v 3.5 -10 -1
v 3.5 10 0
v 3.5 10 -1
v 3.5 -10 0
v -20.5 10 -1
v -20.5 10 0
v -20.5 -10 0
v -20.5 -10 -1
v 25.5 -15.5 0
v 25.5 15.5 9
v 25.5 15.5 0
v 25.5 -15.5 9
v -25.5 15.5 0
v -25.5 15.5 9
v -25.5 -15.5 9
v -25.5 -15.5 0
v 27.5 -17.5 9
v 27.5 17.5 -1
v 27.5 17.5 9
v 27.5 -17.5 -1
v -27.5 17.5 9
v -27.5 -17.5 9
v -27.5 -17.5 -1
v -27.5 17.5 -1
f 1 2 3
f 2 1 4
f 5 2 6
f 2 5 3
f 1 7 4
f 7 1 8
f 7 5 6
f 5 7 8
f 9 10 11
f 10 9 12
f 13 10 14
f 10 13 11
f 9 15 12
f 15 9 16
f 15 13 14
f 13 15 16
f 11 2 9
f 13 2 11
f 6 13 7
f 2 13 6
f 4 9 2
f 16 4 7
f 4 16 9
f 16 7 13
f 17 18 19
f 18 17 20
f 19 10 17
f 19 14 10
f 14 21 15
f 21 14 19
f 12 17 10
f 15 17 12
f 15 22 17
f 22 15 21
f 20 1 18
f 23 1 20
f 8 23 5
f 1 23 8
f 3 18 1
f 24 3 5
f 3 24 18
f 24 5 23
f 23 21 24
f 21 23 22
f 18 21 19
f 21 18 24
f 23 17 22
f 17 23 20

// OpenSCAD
// file: ../Lib/o-ring.scad
module o_ring(id=20,girth=2.5){
    rotate_extrude(angle=360)translate([(id+girth)/2,0])circle(d=girth);
    //cylinder(d=id,h=0.1, center=true);    
}

o_ring(id=40, girth=5);
// file: ../Lib/fillet_cylinder.scad
module filleted_cylinder(
    cylinder_height=2,
    cylinder_radius=1,
    fillet_radius_bottom=1,
    fillet_radius_top=0,
    nfaces=50
) {
    /* created by Kevin Lam on Dec 3, 2016 */
    union() {      
        cylinder(cylinder_height, r=cylinder_radius, $fn=nfaces, false);
        
        if (fillet_radius_bottom > 0) {
            difference() {
                cylinder(fillet_radius_bottom, r=cylinder_radius+fillet_radius_bottom, $fn=nfaces, false);
                translate([0, 0, fillet_radius_bottom])
                rotate_extrude($fn=nfaces)
                translate([cylinder_radius+fillet_radius_bottom, 0, 0])
                circle(fillet_radius_bottom, $fn=nfaces);
            }
        }
        
        if (fillet_radius_top>0) {
            difference() {
                translate([0,0,cylinder_height-fillet_radius_top])
                cylinder(fillet_radius_top, r=cylinder_radius+fillet_radius_top, $fn=nfaces, false);
                
                translate([0, 0, cylinder_height-fillet_radius_top])
                rotate_extrude($fn=nfaces)
                translate([cylinder_radius+fillet_radius_top, 0, 0])
                circle(fillet_radius_top, $fn=nfaces);
            }
        }
    }
}
// file: ../Lib/prism.scad
   module prism(l, w, h){
   polyhedron(
           points=[[0,0,0], [l,0,0], [l,w,0], [0,w,0], [0,w,h], [l,w,h]],
           faces=[[0,1,2,3],[5,4,3,2],[0,4,5,1],[0,3,4],[5,2,1]]
           );

   }
   
// file: ../Lib/corner_radiuser.scad
module cornerRadiuser(radius=6){
    difference(){
        translate([radius/2,radius/2,0])
        cube([radius,radius,radius*2], center=true);
        cylinder(h=(radius*2)+2,r=radius, center=true);
    }
}
// file: ../Lib/steppers.scad
/**
 * Implementation of a model of a 28BYJ-48 type cheapo stepper motor
 */
use <mirrorcopy.scad>;
module stepper28BYJ48(){
    color("light grey"){
        translate([0,-8,0]){
            // Motor body
            translate([0,0,(19/2)*-1]){
                cylinder(d=28,h=19, center=true);
            }

            // Motor snooter
            translate([0,8,0]){
                translate([0,0,(1.5/2)])cylinder(d=9,h=1.5, center=true);
                difference(){
                    translate([0,0,(5/2)+2])cylinder(d=5,h=6, center=true);
                    mirrorCopy([0,1,0]){
                        translate([0,4,(5/2)+2.1])cube([5,5,6.2], center=true);
                    }
                }
            }
            
            // cable gland
            translate([0,(17/2)*-1,(19/2)*-1]){
                cube([14.8,17,19], center=true);
            }
            
            // Attachment crossbar
            difference(){
                hull(){
                    mirrorCopy([1,-0,0]){
                        translate([(35/2),0,(1/2)*-1]){
                            cylinder(h=1,d=7, center=true);
                        }
                    }
                }
                mirrorCopy([1,-0,0]){
                    translate([(35/2),0,(1/2)*-1]){
                        cylinder(h=1+0.01,d=4.2, center=true);
                    }
                }
            }
        }
    }
}


module stepper28BYJ48_cutouts(){
    color("orange"){
        translate([0,-8,0]){
            mirrorCopy([1,-0,0]){
                translate([(35/2),0,(1/2)*-1]){
                    cylinder(h=1+0.01,d=4.2, center=true);
                }
            }
        }
    }
}

module nemaCutout(shaftClearance, shaftGirth, shaftLength, frameSize, holeSpacing,holeDiameter=3,       nemaSlotSlackMM=0, shaft=false){
    translate([0,0,frameSize/-2]){
        hull(){
            mirrorCopy([0,1,0]){
                translate([0,nemaSlotSlackMM/2]){
                    cube([frameSize*1.01,frameSize*1.01,frameSize], center=true);
                }
            }
        }
    }
    if(!shaft){
        translate([0,0,10/2]){
            mirrorCopy([1,0,0]){
                mirrorCopy([0,1,0]){
                    translate([holeSpacing/2,holeSpacing/2,0]){
                        hull(){
                            mirrorCopy([0,1,0]){
                                translate([0,nemaSlotSlackMM/2,0]){
                                    cylinder(d=holeDiameter*1.1,h=30,center=true);
                                }
                            }
                        }
                    }
                }
            }
        }
    }
    
    if(!shaft){
        translate([0,0,-0.5]){
            cylinder(d=shaftClearance*1.03,h=shaftLength+1);
        }
    }else{
        difference(){
            cylinder(d=shaftGirth*1.03,h=shaftLength*2, $fn=360);
            translate([frameSize/-2,(shaftGirth/2)-(shaftGirth)*0.15,shaftLength*0.3+0.01]){
                cube([frameSize,frameSize/2,shaftLength*0.70]);
                translate([0,0,shaftLength*0.70-1])cube([frameSize,frameSize/2,shaftLength+1]);
            }
        }
    }
}

module nema14_cutout(){
    nemaCutout(22,5,24,35,26,3,2, shaft);
}

module nema17_cutout(shaft=false){
    
    nemaCutout(22,5,24,42.3,31,3,2, shaft);
}

nema17_cutout(true);
// file: ../Lib/metric_bolts.scad
capSizeMSizeMultiplier = 1.66*1.01;
printingKerfMM = 0.6;
circleFacets = 60;
boltColour = "LightSkyBlue";
boltClearanceColour = "LightSteelBlue";
boltClearanceTransparency = 0.3;

module metricBoltHex(mSize, structural=false, recessNut=0, chamfer=false){
    // Hex diameter = mSize * 1.8, (or 2.0 if structural
    // We add 1% to make the hex slip in better
    hexDiameter = (mSize * (structural?2.0:1.8) * 1.01) + printingKerfMM;

    color(boltColour)
    translate([0,0,(mSize*0.7)/2])
    cylinder(d=hexDiameter,h=mSize * 0.7, $fn=6, center=true);
    
    if(recessNut > 0){
        color(boltClearanceColour, boltClearanceTransparency)
        translate([0,0,(recessNut/2)*-1+0.1])
        cylinder(d=hexDiameter,h=recessNut+0.1, $fn=6, center=true);
    }
    if(chamfer){
        chamferHeight = mSize*1.5*0.595;
        color(boltClearanceColour, boltClearanceTransparency)
        translate([0,0,(mSize * 0.7)+(chamferHeight/2)])
        cylinder(d1=hexDiameter,d2=0,h=chamferHeight, center=true, $fn=6);
    }
}

module metricSocketCap(mSize, length, structural=false,recessCap=0, chamfer=false, overrideCapSize=0){
    //cap size = M number * 1.5.
    // We add 1% to make the cap head spin nicely in the hole.
    capSize = overrideCapSize > 0 ? overrideCapSize : (mSize * capSizeMSizeMultiplier) + printingKerfMM;
    
    color(boltColour)
        translate([0,0,(length + ((mSize*1.25)/2))])
            cylinder(d=capSize,h=mSize*1.25, center=true, $fn=circleFacets);
    //echo (str("cap size is ", capSize));
    if(recessCap > 0){
        color(boltClearanceColour, boltClearanceTransparency)
        translate([0,0,(length + ((recessCap/2)+(mSize*1.25)))])
        cylinder(d=capSize,h=recessCap, center=true, $fn=circleFacets);
    }
    if(chamfer){
        color(boltClearanceColour, boltClearanceTransparency)
        translate([0,0,(length-((mSize*1.5*0.595)/2))])
        cylinder(d2=capSize,d1=0,h=mSize*1.5*0.595, center=true, $fn=circleFacets);
    }
}

module metricShaft(mSize, length, structural=false){
    color(boltColour)
        translate([0,0,(length/2)])
            cylinder(d=mSize+printingKerfMM, h=length+0.01, center=true, $fn=circleFacets);
}

module metricSocketScrew(mSize, length, structural=false, recessCap=0, chamfer=false, overrideCapSize=0){
    metricSocketCap(mSize, length, structural=structural, recessCap=recessCap, chamfer=chamfer, overrideCapSize=overrideCapSize);
    metricShaft(mSize, length, structural=structural);
}

module metricCapheadAndBolt(mSize, length=40, structural=false, recessCap=0, recessNut=0, chamfer=false, overrideCapSize=0){
    capSize = overrideCapSize > 0 ? overrideCapSize : (mSize * capSizeMSizeMultiplier) + printingKerfMM;

    /*echo (str("Creating a M",mSize, " size, ", length, "mm long bolt with a ", capSize, "mm wide caphead and bolt ", chamfer?"with":"without", " chamfering."));
    if(recessCap){
        echo (str("It has a ", recessCap, "mm recessed cap"));
    }
    if(recessNut){
        echo (str("It has a ", recessCap, "mm recessed nut"));
    }/**/
    translate([0,0,((length/2)+((mSize*1.25)/2))*-1])
    union(){
        translate([0, 0, 0])
        metricSocketScrew(mSize, length, structural=structural, recessCap=recessCap, chamfer=chamfer, overrideCapSize=overrideCapSize);
        metricBoltHex(mSize,structural, recessNut=recessNut, chamfer=chamfer);
    }
}

/**/
translate([0,10,0])
metricCapheadAndBolt(6, 40);

translate([20,10,0])
metricCapheadAndBolt(6, 40, recessNut=1, recessCap=1, chamfer=true);
/**/
/*
translate([0,10,0])
metricCapheadAndBolt(6, 20, recessNut=10, recessCap=10);
/*
translate([0,20,0])
metricCapheadAndBolt(6, 20, chamfer=true);

translate([20,0,0])
metricCapheadAndBolt(10, 40);

translate([20,20,0])
metricCapheadAndBolt(10, 40, recessNut=10, recessCap=10);

translate([20,40,0])
metricCapheadAndBolt(10, 40, chamfer=true);
*/
// file: ../Lib/pcd.scad
module pcd(degrees){
    count=360/degrees;
    for(i=[1 : count]){
        rotate(degrees*i)
        children();
    }
}

module pcdAtFixedDegrees(degrees){
    for(degree=degrees){
        rotate(degree)
        children();
    }
}
// file: ../Lib/extrusion.scad
use <mirrorcopy.scad>
module doubleExtrusion(width,length, center=false){
    extraWallWidth = width*0.09;
    mirrorCopy([0,1,0]){
        color("orange")
        translate([0,(width - extraWallWidth)/2,length/2])
        cube([center?0:width/2,extraWallWidth,length], center=true);
    }
    
    translate([(width/2),0,0])
    children();
    translate([(width/2)*-1,0,0])
    children();
    color("grey",0.1)hull(){
        translate([(width/2),0,0])
        children();
        translate([(width/2)*-1,0,0])
        children();
    }
}

module extrusion_sub(length=10, outer=40, tSlot=8, gusset=4.5, bore=7, center=false){
    translate([0,0,center?0:length/2]){
        difference(){
            color("orange")
            union(){
                // Corners
                mirrorCopy([1,0,0]){
                    mirrorCopy([0,1,0]){
                        difference(){
                            union(){
                                translate([((outer-(outer-tSlot)/2)/2),(outer-(gusset))/2,0])
                                cube([(outer-tSlot)/2, (gusset),length], center=true);
                                mirror([-1,1,0])
                                translate([((outer-(outer-tSlot)/2)/2),(outer-(gusset))/2,0])
                                cube([(outer-tSlot)/2, (gusset),length], center=true);
                            }
                            difference(){
                                translate([((outer-(gusset))/2)+1,((outer-(gusset))/2)+1,0])
                                    cube([gusset*2,gusset*2,length+2], center=true);
                                translate([(outer-(gusset*2))/2,(outer-(gusset*2))/2,0])
                                    cylinder(d=gusset*2,h=length+4, center=true);
                            }
                        }
                    }
                }
                
                // Crossbar
                mirrorCopy(){
                    rotate(45)
                    cube([outer*1.3, gusset, length], center=true);
                }
                
                // Core
                cube([bore*2,bore*2,length], center=true);
            };
            
            union(){
                // Tappable Bore
                cylinder(d=bore, h=length+2, center=true);
            }
        }
    }
}
module extrusion(length=10, outer=40, tSlot=8, gusset=4.5, bore=7, center=false){
    color("grey",0.1)hull()extrusion_sub(length=length, outer=outer, tSlot=tSlot, gusset=gusset, bore=bore, center=center);
    extrusion_sub(length=length, outer=outer, tSlot=tSlot, gusset=gusset, bore=bore, center=center);
    echo(str("BOM: Extrusion(",outer,"mm) length=",length,"mm"));
}

module extrusion80x40(length, center=false){
    doubleExtrusion(40,length, center=center)
    extrusion40x40(length, center=center);
}
module extrusion60x30(length, center=false){
    doubleExtrusion(30,length, center=center)
    extrusion30x30(length, center=center);
}
module extrusion40x20(length, center=false){
    doubleExtrusion(20,length, center=center)
    extrusion20x20(length, center=center);
}

module extrusion20x20(length, center=false)
{
    extrusion(length=length, outer=20,tSlot=5, gusset=1.8, bore=4, center=center);
}

module extrusion30x30(length, center=false)
{
    extrusion(length=length, outer=30,tSlot=8, gusset=2.5, bore=7, center=center);
}

module extrusion40x40(length, center=false)
{
    extrusion(length=length, outer=40,tSlot=8, gusset=4.5, bore=7, center=center);
}
/**/
translate([-40,0,0])extrusion20x20(10, center=true);
translate([-60,30,0])extrusion30x30(10, center=true);
translate([-80,30+40,0])extrusion40x40(10, center=true);

translate([0,0,0])extrusion20x20(10);
translate([0,30,0])extrusion30x30(10);
translate([0,30+40,0])extrusion40x40(10);

translate([40,0,0])extrusion40x20(10);
translate([60,30,0])extrusion60x30(10);
translate([80,30+40,0])extrusion80x40(10);
/**/
// file: ../Lib/part_splitter.scad
module partSplitter(height=0,maxSize=200, spread=10, top=true, bottom=true){
    if($preview){
        children();
        translate([0,0,height])
            #cube([maxSize,maxSize,0.01], center=true);
    }else{
        if(top){
            color("red")
                translate([0,0,(spread/2)])
                    difference(){
                        children();
                        translate([0,0,((maxSize/2)*-1)+height])
                            cube([maxSize,maxSize,maxSize], center=true);
                    }
        }
        if(bottom){
            color("green")
                translate([0,0,(spread/2)*-1])
                    difference(){
                        children();
                        translate([0,0,(maxSize/2)+height])
                            cube([maxSize,maxSize,maxSize], center=true);
                    }
        }
    }
} 
// file: ../Lib/mirrorcopy.scad
module mirrorCopy(vec=[1,0,0]){
    children();
    mirror(vec) children();
} 
// file: ../Lib/bearings.scad
$useMcMaster = true;
module bearing(id, od, wd, mcmaster, series, labels=false){
    echo(str("Creating a ", series, " bearing with id=", id, "mm od=", od, "mm width=", wd, "mm ..."));
    difference(){
        color("grey")cylinder(d=od,h=wd, center=true);
        color("white")cylinder(d=id,h=wd+1, center=true);  
        if($preview && labels){
            bearing_lettering(id, od, wd, mcmaster, series);    
        }
    }
}

module bearing_lettering(id, od, wd, mcmaster, series)
{
    degreesSeries = 25*len(series);
    degreesMcMaster = 25*len(mcmaster);
    color("black")
    rotate(180+45){
        rotate(degreesSeries)
        bearing_text(id,od, wd, series,degreesSeries);
        if($useMcMaster){
            rotate(degreesMcMaster+degreesSeries+10)
            bearing_text(id,od, wd, mcmaster, degreesMcMaster);   
        }
    }
}

module bearing_text(id, od, wd, st, radiusConsumed=180){
    bearingGirth = (od-id)/2;
    letterHeight = bearingGirth * 0.6;
    letterOffsetFromCenter = (od/2) - (bearingGirth*0.9);
    
    width=bearingGirth ;
    thickness=wd/20 ;
    chars=len(st)+1 ;
    //echo(str("Writing ", st, " at " , letterOffsetFromCenter, "mm from center"));
    for (i = [1:chars]) {
            rotate([0,0,90-(i*(radiusConsumed/chars))])
            translate([0,letterOffsetFromCenter,(bearingGirth/2)-((thickness+1)/2)])
            linear_extrude(thickness+1)
            text(st[i-1],size=letterHeight, halign="center");
    }
}


module bearing_608(labels=true){ bearing(8,22,7,"5972K91","608", labels=labels); }
module bearing_629(labels=true){ bearing(9,26,8,"5972K93","629", labels=labels); }
module bearing_635(labels=true){ bearing(5,19,6,"5972K197","635", labels=labels); }
module bearing_6000(labels=true){ bearing(10,26,8,"5972K94","6000", labels=labels); }
module bearing_6001(labels=true){ bearing(12,28,8,"5972K95","6001", labels=labels); }
module bearing_6002(labels=true){ bearing(15,32,9,"5972K358","6002", labels=labels); }
module bearing_6003(labels=true){ bearing(17,35,10,"5972K311","6003", labels=labels); }
module bearing_6007(labels=true){ bearing(35,62,14,"5972K312","6007", labels=labels); }
module bearing_6200(labels=true){ bearing(10,30,9,"5972K101","6200", labels=labels); }
module bearing_6201(labels=true){ bearing(12,32,10,"5972K313","6201", labels=labels); }
module bearing_6202(labels=true){ bearing(15,35,11,"5972K314","6202", labels=labels); }
module bearing_6203(labels=true){ bearing(17,40,12,"5972K104","6203", labels=labels); }
module bearing_6204(labels=true){ bearing(20,47,14,"5972K105","6204", labels=labels); }
module bearing_6205(labels=true){ bearing(25,52,15,"5972K315","6205", labels=labels); }
module bearing_6206(labels=true){ bearing(30,62,16,"5972K316","6206", labels=labels); }
module bearing_6207(labels=true){ bearing(35,72,17,"5972K317","6207", labels=labels); }
module bearing_6208(labels=true){ bearing(40,80,18,"5972K114","6208", labels=labels); }
module bearing_6209(labels=true){ bearing(45,85,19,"5972K115","6209", labels=labels); }
module bearing_6210(labels=true){ bearing(50,90,20,"5972K129","6210", labels=labels); }
module bearing_6211(labels=true){ bearing(55,100,21,"5972K113","6211", labels=labels); }
module bearing_6212(labels=true){ bearing(60,110,22,"5972K3","6212", labels=labels); }
module bearing_6301(labels=true){ bearing(12,37,12,"5972K318","6301", labels=labels); }
module bearing_6302(labels=true){ bearing(15,42,13,"5972K117","6302", labels=labels); }
module bearing_6303(labels=true){ bearing(17,47,14,"5972K118","6303", labels=labels); }
module bearing_6304(labels=true){ bearing(20,52,15,"5972K119","6304", labels=labels); }
module bearing_6305(labels=true){ bearing(25,62,17,"5972K121","6305", labels=labels); }
module bearing_6306(labels=true){ bearing(30,72,19,"5972K319","6306", labels=labels); }
module bearing_6307(labels=true){ bearing(35,80,21,"5972K503","6307", labels=labels); }
module bearing_6308(labels=true){ bearing(40,90,23,"5972K124","6308", labels=labels); }
module bearing_6309(labels=true){ bearing(45,100,25,"5972K125","6309", labels=labels); }
module bearing_6310(labels=true){ bearing(50,110,27,"5972K126","6310", labels=labels); }
module bearing_6311(labels=true){ bearing(55,120,29,"5972K127","6311", labels=labels); }
module bearing_6312(labels=true){ bearing(60,130,31,"5972K128","6312", labels=labels); }
module bearing_6403(labels=true){ bearing(17,62,17,"5972K198","6403", labels=labels); }
module bearing_6800(labels=true){ bearing(10,19,5,"5972K211","6800", labels=labels); }
module bearing_6801(labels=true){ bearing(12,21,5,"5972K212","6801", labels=labels); }
module bearing_6802(labels=true){ bearing(15,24,5,"5972K213","6802", labels=labels); }
module bearing_6803(labels=true){ bearing(17,26,5,"5972K214","6803", labels=labels); }
module bearing_6804(labels=true){ bearing(20,32,7,"5972K215","6804", labels=labels); }
module bearing_6805(labels=true){ bearing(25,37,7,"5972K216","6805", labels=labels); }
module bearing_6806(labels=true){ bearing(30,42,7,"5972K217","6806", labels=labels); }
module bearing_6900(labels=true){ bearing(10,22,6,"5972K241","6900", labels=labels); }
module bearing_6901(labels=true){ bearing(12,24,6,"5972K242","6901", labels=labels); }
module bearing_6902(labels=true){ bearing(15,28,7,"5972K243","6902", labels=labels); }
module bearing_6903(labels=true){ bearing(17,30,7,"5972K244","6903", labels=labels); }
module bearing_6904(labels=true){ bearing(20,37,9,"5972K245","6904", labels=labels); }
module bearing_6905(labels=true){ bearing(25,42,9,"5972K246","6905", labels=labels); }
module bearing_6906(labels=true){ bearing(30,47,9,"5972K247","6906", labels=labels); }
module bearing_6907(labels=true){ bearing(35,55,10,"5972K248","6907", labels=labels); }
module bearing_6908(labels=true){ bearing(40,62,12,"5972K249","6908", labels=labels); }
module bearing_16002(labels=true){ bearing(15,32,8,"5972K199","16002", labels=labels); }
module bearing_16004(labels=true){ bearing(20,42,8,"5972K218","16004", labels=labels); }
module bearing_16005(labels=true){ bearing(25,47,8,"5972K219","16005", labels=labels); }
module bearing_16100(labels=true){ bearing(10,28,8,"5972K223","16100", labels=labels); }
module bearing_16101(labels=true){ bearing(12,30,8,"5972K224","16101", labels=labels); }

translate([0,0,0])
{   
    bearing_6800();
    bearing_6804();
    bearing_6907();
    translate([50,0,0])
    bearing_16101();
}


translate([0,60,0])
{   
    bearing_6800(labels=false);
    bearing_6804(labels=false);
    bearing_6907(labels=false);
    translate([50,0,0])
    bearing_16101(labels=false);
}
// file: ../Lib/mattlib.scad
include <../Lib/bearings.scad>;
include <../Lib/mirrorcopy.scad>;
include <../Lib/part_splitter.scad>;
include <../Lib/extrusion.scad>;
include <../Lib/pcd.scad>;
include <../Lib/metric_bolts.scad>;
include <../Lib/steppers.scad>;
include <../Lib/corner_radiuser.scad>;
include <../Lib/gears.scad>;
include <../Lib/prism.scad>;
include <../Lib/fillet_cylinder.scad>;
include <../Lib/o-ring.scad>;
// main file
use <../Lib/mattlib.scad>;

module power_supply_cutout(){
    translate([0,0,0]){
        translate([(-51/2)+(24/2)+5,(126/2)+(20/2),0]){
            cube([24,20+0.1,20], center=true);
        }
        cube([51,126,31], center=true);
    }
}
difference(){
    translate([0,0,4])#cube([55,35,10], center=true);
    translate([0,0,63])rotate([-90,0,0])power_supply_cutout();
    
}
